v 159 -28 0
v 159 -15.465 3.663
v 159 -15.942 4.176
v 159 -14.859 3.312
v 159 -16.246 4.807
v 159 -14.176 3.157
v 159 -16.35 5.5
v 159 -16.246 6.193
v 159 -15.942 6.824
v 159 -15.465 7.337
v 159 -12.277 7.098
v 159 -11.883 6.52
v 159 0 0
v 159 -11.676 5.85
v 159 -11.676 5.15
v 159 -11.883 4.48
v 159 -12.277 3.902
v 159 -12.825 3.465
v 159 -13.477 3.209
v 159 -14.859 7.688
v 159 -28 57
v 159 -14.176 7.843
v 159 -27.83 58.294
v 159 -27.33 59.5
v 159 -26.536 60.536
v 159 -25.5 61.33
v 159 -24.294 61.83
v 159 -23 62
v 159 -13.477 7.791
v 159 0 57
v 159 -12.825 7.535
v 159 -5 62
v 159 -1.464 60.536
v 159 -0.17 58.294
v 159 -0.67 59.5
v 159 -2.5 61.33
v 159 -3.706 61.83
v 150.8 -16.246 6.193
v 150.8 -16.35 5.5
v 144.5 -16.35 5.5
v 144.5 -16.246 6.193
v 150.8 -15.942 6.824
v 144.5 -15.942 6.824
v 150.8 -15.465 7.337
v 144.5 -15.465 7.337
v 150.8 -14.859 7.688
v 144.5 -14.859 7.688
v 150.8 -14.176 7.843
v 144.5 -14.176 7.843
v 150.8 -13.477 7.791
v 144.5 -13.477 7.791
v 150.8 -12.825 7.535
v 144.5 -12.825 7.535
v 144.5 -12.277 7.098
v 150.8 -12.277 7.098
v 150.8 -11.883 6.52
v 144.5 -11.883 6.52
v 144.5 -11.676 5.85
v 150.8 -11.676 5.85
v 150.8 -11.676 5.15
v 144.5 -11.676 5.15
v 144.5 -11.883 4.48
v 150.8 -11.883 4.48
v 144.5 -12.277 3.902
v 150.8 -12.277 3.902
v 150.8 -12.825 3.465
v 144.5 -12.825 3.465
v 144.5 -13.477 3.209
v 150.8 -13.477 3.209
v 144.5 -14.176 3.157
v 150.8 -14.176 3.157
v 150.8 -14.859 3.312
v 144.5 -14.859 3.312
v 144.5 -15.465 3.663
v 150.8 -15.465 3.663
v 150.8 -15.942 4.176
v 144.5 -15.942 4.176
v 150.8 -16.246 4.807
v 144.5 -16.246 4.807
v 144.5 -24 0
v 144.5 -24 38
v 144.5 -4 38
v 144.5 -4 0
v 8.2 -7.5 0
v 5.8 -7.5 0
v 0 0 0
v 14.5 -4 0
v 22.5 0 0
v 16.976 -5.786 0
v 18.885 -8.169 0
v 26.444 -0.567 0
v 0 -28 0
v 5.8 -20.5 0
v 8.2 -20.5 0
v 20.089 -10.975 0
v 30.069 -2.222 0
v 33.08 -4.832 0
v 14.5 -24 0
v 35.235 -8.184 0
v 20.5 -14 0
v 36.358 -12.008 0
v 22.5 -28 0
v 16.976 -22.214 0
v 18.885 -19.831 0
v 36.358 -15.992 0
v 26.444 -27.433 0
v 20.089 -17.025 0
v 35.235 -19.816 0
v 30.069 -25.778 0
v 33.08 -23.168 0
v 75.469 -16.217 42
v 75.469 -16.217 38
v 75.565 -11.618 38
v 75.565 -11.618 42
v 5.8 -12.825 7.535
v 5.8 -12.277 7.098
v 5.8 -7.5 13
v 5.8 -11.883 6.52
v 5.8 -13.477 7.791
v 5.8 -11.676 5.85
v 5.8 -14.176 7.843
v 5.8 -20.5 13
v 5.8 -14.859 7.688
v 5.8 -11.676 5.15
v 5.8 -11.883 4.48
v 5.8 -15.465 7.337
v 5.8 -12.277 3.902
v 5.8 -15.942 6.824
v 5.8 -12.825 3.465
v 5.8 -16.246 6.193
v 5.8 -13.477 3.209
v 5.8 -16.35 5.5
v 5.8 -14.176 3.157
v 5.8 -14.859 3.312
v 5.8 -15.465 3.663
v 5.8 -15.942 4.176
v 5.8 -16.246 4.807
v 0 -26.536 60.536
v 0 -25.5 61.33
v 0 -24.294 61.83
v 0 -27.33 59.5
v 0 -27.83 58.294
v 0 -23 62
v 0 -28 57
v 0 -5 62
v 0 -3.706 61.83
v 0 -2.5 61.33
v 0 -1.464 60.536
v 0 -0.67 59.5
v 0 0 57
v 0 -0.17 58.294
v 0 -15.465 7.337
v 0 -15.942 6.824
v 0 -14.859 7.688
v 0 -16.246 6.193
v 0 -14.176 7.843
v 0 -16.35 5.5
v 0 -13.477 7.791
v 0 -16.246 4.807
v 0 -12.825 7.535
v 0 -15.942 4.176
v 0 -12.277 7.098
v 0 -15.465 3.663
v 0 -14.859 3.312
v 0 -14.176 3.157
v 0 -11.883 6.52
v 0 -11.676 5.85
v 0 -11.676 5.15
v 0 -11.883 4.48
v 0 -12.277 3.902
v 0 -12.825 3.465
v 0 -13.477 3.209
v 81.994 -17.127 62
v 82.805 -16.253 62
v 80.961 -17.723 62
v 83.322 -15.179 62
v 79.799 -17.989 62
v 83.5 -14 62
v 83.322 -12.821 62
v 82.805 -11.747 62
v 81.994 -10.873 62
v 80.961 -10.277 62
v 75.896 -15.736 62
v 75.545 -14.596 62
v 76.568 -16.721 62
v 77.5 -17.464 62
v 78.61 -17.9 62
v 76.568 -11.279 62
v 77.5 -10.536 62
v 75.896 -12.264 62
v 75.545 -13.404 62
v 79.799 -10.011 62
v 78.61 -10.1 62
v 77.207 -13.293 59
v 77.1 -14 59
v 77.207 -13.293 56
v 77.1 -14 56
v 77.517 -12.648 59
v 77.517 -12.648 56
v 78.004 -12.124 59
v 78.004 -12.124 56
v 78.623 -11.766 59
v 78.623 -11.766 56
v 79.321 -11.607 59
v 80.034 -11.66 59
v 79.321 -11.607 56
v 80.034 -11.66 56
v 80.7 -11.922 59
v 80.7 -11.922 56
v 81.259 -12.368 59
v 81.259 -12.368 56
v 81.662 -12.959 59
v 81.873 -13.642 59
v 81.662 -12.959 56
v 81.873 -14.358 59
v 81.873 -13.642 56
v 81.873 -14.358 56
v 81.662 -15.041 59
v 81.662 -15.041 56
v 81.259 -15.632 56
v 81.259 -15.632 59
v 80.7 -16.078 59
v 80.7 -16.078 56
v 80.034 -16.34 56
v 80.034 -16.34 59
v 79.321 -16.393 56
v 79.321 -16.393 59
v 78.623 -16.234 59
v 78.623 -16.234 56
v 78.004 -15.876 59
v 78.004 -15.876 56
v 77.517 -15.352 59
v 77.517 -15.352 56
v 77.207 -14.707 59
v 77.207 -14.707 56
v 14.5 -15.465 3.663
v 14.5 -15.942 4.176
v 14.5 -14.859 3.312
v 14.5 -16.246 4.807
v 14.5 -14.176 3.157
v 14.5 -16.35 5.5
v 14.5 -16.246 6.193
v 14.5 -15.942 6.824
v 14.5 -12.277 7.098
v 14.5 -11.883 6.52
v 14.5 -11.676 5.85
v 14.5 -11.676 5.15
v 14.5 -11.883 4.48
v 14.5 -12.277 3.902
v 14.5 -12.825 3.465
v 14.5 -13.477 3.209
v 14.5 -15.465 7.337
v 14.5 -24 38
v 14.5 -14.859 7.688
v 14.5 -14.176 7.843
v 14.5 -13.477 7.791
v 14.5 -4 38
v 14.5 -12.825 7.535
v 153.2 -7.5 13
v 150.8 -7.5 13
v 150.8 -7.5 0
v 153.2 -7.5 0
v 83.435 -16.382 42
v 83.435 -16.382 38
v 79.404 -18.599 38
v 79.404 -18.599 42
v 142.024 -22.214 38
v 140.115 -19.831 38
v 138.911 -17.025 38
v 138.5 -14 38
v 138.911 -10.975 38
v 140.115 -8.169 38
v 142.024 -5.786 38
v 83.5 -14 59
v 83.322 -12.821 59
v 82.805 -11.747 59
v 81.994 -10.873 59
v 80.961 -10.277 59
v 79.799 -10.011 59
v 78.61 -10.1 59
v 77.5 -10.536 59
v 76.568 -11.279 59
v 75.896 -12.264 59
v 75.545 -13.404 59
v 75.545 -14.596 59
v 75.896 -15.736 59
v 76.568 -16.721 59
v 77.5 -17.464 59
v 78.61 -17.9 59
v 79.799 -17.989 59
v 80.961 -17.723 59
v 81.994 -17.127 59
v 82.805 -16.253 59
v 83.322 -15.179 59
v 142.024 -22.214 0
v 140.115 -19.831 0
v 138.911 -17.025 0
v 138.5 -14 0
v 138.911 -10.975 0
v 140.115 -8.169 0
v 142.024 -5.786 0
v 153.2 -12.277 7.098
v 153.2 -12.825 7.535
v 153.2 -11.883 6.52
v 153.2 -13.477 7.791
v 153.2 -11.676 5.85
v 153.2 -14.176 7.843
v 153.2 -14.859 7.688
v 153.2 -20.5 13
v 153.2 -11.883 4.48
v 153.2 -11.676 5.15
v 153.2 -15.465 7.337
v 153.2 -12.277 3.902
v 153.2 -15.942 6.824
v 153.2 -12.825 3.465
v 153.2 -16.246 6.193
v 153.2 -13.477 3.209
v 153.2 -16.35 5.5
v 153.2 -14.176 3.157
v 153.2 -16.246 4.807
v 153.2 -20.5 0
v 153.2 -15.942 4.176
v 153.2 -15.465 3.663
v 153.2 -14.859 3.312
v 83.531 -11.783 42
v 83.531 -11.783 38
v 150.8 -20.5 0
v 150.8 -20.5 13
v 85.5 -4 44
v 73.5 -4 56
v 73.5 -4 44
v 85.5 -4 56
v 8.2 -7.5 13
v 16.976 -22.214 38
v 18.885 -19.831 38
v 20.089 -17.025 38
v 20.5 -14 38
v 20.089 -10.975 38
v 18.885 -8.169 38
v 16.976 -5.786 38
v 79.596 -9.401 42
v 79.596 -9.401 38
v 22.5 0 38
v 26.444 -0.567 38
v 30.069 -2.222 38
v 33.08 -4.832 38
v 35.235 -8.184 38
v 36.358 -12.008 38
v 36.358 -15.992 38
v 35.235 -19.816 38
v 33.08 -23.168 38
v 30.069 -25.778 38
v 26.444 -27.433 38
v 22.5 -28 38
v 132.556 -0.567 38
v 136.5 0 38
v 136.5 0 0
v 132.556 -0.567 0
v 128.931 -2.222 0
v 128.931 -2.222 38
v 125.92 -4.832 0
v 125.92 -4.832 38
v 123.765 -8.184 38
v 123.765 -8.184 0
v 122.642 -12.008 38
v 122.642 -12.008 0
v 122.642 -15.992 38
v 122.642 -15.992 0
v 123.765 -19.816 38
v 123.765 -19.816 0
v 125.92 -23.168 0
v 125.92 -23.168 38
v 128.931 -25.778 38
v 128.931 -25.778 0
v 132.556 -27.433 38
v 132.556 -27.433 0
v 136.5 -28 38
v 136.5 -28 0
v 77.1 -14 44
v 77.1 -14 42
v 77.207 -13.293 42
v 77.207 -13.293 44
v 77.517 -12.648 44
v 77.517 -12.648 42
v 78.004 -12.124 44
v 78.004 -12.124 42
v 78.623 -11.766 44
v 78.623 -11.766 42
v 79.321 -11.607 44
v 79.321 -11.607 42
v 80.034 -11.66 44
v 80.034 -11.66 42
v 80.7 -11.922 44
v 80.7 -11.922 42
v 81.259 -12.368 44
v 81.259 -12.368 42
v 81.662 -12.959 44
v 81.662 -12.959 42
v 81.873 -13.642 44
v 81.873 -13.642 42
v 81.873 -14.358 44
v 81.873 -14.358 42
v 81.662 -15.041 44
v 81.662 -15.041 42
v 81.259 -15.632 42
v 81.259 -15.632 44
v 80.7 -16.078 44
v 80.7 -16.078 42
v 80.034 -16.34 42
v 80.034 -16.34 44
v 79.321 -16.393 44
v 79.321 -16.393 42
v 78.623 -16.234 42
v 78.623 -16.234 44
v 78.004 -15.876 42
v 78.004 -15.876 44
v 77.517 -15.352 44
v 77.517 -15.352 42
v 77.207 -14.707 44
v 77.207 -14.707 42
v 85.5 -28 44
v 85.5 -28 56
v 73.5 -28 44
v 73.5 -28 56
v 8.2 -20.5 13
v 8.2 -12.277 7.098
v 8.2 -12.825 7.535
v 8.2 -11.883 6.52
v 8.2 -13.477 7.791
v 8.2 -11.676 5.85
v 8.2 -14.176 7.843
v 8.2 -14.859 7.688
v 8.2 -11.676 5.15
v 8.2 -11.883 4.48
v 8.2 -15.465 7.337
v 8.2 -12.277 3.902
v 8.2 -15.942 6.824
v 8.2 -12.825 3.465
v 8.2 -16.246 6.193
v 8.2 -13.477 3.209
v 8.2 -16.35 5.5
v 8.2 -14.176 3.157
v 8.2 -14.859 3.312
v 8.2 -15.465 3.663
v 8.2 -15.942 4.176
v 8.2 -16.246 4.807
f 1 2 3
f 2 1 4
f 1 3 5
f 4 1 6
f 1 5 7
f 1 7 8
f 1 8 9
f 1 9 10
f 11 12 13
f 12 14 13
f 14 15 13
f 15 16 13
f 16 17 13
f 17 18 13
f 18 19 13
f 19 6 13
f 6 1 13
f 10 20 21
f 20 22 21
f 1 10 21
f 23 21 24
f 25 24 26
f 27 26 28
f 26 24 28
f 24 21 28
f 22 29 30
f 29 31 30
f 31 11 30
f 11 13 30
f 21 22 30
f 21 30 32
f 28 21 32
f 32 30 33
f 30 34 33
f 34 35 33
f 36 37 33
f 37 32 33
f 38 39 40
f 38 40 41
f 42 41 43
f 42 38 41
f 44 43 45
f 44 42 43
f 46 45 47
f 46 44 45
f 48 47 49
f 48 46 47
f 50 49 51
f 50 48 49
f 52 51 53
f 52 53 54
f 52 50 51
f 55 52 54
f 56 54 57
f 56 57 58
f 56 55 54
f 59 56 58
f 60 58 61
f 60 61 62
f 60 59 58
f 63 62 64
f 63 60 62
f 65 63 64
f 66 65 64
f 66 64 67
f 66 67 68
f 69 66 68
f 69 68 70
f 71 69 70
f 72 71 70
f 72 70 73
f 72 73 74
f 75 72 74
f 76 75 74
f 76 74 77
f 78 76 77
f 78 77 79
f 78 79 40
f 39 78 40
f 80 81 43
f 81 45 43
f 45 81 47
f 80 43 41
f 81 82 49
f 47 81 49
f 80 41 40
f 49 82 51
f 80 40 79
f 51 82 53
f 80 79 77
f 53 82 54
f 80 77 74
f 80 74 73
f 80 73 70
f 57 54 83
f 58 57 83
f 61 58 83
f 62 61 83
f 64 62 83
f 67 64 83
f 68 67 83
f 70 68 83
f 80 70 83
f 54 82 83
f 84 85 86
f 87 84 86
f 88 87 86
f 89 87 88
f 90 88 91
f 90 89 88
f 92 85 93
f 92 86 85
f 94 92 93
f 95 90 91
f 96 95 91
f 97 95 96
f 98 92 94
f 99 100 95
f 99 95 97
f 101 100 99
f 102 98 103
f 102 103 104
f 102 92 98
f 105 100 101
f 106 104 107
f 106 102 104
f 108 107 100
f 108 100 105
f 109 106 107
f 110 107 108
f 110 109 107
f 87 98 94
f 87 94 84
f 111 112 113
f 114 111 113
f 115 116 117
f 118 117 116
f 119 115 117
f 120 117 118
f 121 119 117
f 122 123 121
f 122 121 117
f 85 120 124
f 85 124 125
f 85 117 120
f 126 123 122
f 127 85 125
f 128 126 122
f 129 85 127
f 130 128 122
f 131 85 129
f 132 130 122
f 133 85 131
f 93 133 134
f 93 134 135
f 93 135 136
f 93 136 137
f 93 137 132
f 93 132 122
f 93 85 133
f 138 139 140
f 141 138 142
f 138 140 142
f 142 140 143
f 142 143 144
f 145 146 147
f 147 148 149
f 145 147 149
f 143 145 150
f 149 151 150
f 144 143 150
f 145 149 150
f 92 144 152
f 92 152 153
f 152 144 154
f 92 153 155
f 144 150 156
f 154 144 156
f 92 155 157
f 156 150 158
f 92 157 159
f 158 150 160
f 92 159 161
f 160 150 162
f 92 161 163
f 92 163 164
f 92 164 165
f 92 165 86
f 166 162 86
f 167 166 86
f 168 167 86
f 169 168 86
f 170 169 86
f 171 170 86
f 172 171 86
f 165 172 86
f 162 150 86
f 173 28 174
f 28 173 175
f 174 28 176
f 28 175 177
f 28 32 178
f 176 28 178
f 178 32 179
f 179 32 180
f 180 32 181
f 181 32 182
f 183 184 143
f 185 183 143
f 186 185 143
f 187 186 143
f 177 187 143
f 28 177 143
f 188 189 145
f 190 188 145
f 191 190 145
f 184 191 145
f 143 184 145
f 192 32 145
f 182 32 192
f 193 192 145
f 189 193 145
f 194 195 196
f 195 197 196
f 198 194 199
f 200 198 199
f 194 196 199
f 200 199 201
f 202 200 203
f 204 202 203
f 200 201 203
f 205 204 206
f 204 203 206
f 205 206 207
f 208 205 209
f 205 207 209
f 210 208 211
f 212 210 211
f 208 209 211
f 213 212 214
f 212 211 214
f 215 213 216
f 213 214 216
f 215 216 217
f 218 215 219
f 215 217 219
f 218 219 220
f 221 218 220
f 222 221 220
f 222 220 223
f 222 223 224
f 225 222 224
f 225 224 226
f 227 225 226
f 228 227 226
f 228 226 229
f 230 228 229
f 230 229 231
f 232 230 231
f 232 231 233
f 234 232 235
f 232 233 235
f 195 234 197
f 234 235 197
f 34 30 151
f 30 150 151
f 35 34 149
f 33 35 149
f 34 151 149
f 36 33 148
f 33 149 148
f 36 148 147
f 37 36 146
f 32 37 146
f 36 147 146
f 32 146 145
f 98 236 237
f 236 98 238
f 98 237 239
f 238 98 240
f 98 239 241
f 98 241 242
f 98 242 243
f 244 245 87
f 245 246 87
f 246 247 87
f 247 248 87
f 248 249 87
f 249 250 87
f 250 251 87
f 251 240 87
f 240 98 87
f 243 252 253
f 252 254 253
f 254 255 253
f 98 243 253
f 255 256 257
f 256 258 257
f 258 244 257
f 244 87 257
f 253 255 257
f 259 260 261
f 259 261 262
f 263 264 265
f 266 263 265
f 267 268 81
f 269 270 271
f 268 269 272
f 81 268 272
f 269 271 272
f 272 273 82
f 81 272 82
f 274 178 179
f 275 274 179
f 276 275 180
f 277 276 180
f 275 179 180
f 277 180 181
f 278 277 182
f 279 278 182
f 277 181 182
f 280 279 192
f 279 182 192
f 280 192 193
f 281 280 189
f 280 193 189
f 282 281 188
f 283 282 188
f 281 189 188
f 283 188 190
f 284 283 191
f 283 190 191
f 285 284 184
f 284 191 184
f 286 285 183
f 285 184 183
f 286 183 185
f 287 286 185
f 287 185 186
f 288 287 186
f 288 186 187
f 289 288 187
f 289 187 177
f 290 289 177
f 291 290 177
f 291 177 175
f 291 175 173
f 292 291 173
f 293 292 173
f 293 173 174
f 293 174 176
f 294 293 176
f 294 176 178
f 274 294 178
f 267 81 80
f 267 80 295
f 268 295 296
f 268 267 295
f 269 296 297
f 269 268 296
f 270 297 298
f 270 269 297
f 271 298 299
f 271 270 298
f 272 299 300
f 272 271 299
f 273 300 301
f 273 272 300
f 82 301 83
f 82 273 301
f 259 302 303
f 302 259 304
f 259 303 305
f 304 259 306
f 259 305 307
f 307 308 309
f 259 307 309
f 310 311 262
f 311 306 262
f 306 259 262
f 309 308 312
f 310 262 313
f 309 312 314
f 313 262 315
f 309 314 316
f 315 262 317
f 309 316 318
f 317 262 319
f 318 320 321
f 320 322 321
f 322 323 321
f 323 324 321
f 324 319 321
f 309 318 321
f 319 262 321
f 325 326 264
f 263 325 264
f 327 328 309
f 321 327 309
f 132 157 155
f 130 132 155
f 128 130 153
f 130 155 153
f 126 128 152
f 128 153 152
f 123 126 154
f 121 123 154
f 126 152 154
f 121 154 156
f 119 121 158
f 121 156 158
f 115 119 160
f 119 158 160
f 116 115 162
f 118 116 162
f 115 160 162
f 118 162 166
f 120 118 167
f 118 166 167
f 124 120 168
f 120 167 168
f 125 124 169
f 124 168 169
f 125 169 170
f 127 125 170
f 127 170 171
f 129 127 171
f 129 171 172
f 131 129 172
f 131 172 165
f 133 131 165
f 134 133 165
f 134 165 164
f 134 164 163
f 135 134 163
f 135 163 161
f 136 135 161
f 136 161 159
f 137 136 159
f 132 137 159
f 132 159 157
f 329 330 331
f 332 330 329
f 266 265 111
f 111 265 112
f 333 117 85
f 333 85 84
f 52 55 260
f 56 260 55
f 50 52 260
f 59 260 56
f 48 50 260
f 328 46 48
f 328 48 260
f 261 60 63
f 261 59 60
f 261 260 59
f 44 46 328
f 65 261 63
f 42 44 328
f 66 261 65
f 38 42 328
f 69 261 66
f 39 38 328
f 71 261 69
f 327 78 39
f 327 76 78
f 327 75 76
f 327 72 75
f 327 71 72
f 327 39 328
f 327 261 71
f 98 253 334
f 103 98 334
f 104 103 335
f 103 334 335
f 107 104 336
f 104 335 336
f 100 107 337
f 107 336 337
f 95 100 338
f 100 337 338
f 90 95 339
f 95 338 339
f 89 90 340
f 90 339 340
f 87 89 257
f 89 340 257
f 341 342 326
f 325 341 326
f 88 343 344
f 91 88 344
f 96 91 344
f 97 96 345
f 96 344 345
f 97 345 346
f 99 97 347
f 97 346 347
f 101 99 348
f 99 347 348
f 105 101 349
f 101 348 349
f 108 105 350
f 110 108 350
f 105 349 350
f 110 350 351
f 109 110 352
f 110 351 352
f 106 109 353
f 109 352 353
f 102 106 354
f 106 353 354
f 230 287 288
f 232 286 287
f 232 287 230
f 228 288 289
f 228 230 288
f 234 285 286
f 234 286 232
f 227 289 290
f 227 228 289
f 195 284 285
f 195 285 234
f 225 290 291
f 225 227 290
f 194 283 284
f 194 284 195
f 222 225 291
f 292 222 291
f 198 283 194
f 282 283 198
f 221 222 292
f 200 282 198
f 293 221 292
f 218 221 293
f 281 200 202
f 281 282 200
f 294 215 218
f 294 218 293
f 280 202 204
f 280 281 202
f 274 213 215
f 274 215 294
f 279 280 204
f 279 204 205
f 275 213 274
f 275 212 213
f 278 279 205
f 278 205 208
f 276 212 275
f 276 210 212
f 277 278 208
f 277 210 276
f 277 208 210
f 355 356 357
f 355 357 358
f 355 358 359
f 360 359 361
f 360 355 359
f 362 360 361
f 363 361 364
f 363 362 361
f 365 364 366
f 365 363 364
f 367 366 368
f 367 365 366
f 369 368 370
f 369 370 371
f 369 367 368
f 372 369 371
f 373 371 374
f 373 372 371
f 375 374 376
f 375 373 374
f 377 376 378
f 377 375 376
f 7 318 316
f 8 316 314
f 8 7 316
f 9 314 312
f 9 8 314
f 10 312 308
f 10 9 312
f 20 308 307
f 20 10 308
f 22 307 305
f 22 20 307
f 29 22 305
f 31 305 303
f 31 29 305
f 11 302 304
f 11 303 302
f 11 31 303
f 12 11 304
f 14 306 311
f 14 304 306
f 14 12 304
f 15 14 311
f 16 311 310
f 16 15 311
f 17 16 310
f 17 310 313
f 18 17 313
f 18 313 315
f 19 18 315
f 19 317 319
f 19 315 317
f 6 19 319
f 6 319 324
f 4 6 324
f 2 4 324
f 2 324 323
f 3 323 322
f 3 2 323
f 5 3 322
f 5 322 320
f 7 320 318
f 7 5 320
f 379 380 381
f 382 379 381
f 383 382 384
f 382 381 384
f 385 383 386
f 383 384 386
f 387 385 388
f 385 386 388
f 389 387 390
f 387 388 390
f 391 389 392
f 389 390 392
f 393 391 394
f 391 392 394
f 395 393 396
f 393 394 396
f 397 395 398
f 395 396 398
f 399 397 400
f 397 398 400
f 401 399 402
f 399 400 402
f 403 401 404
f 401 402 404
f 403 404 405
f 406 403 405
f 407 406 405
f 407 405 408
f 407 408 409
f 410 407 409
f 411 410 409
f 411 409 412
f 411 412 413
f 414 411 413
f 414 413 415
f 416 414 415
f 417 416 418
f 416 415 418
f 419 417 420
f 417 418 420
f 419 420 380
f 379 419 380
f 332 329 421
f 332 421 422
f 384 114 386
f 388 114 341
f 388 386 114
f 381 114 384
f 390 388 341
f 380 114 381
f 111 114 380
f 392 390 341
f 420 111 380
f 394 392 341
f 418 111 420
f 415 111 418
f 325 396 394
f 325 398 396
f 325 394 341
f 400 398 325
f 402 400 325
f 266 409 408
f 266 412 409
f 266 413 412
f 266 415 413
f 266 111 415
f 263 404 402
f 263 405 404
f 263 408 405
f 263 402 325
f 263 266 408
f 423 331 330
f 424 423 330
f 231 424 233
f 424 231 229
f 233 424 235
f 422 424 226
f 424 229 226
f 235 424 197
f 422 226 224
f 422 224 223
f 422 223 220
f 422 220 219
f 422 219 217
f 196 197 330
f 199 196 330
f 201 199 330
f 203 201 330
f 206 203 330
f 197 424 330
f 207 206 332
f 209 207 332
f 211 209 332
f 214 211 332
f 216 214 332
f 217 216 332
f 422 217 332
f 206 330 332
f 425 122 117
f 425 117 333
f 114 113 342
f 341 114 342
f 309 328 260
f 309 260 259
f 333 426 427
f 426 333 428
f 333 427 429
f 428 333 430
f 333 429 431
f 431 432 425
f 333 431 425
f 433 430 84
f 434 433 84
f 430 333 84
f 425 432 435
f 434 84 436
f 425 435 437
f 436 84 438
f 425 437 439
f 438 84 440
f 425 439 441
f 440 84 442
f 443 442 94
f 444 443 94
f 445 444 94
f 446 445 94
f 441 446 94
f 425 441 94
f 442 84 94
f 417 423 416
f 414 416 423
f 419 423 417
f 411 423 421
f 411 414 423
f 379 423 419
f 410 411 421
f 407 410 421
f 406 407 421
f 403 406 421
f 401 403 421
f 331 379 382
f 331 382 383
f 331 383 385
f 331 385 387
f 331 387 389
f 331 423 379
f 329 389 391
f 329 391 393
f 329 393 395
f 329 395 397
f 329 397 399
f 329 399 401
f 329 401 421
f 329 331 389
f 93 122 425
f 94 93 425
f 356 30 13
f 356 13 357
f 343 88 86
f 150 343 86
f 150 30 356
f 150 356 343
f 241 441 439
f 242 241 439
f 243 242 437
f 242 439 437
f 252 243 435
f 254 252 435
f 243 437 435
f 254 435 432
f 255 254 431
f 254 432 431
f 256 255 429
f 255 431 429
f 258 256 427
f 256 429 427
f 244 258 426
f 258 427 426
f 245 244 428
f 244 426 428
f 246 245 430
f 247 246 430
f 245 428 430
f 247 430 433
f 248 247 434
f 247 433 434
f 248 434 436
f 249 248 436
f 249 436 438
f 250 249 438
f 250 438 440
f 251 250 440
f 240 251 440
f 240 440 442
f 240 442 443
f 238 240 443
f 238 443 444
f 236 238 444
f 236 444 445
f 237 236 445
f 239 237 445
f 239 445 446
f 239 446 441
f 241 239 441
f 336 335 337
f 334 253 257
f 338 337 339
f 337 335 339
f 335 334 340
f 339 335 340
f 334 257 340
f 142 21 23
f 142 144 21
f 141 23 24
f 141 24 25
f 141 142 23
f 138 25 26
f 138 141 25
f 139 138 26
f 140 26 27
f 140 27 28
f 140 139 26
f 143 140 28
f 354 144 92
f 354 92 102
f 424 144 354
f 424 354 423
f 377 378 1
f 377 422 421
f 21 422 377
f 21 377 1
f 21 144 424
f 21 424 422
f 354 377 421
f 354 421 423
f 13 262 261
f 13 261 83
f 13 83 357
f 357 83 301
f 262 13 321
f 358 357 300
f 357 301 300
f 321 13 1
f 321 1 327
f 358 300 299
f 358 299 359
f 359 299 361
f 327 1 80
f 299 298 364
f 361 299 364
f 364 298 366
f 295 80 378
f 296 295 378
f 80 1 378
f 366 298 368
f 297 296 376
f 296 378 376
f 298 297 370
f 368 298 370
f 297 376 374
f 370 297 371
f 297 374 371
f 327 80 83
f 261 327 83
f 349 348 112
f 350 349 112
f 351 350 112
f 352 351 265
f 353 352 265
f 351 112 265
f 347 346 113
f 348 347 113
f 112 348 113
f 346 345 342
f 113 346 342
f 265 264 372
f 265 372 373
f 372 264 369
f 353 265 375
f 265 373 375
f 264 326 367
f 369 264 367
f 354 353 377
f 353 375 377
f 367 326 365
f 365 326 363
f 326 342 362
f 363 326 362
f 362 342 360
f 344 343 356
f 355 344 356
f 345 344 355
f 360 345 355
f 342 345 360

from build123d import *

# Parameters (mm, degrees)
F0_W            = 12
F0_H            = 12
F1_DEPTH        = 28
F2_DEPTH        = 4
F3_W            = 2.4
F3_H            = 13
F4_DEPTH        = 13
F5_R            = 2.35
F6_DEPTH        = 14.5
F9_DEPTH        = 38
F11_D           = 4.8
F11_CBORE_D     = 8
F11_CBORE_DEPTH = 3
F12_DEPTH       = 4
F13_R           = 5


# Not quite as in the source:
# - a pattern or mirror of a feature is missing from the dataset's text; its kind, count and spacing are read off the source's solid


with BuildPart() as f1:
    # F0 (on Front) → F1 (new body)
    with BuildSketch(Plane.XZ):
        Polygon((0, 62), (0, 0), (14.5, 0), (14.5, 38), (144.5, 38), (144.5, 0), (159, 0), (159, 62), align=None)
        with Locations((79.5, 50)):
            Rectangle(F0_W, F0_H, mode=Mode.SUBTRACT)
    extrude(amount=F1_DEPTH)

    # F0 (on Front) → F2 (join)
    with BuildSketch(Plane.XZ):
        with Locations((79.5, 50)):
            Rectangle(F0_W, F0_H)
    extrude(amount=F2_DEPTH)

    # F3 (on face) → F4 (cut)
    with BuildSketch(Plane(origin=(0, 0, 0), x_dir=(1, 0, 0), z_dir=(0, 0, -1))):
        with Locations((7, 14)):
            Rectangle(F3_W, F3_H)
        with Locations((152, 14)):
            Rectangle(F3_W, F3_H)
    extrude(amount=-F4_DEPTH, mode=Mode.SUBTRACT)

    # F5 (on face) → F6 (cut)
    with BuildSketch(Plane(origin=(0, 0, 0), x_dir=(0, -1, 0), z_dir=(-1, 0, 0))):
        with Locations((14, 5.5)):
            Circle(F5_R)
    f6 = extrude(amount=-F6_DEPTH, mode=Mode.SUBTRACT)

    # F6_copies: F6 across plane
    add(f6.mirror(Plane(origin=(79.5, 0, 0), x_dir=(0, 0, 1), z_dir=(1, 0, 0))), mode=Mode.SUBTRACT)

    # F8 (on face) → F9 (join, through all)
    with BuildSketch(Plane(origin=(0, 0, 38), x_dir=(1, 0, 0), z_dir=(0, 0, -1))):
        with BuildLine():
            ThreePointArc((14.5, 24), (20.5, 14), (14.5, 4))
            Line((14.5, 4), (14.5, 0))
            Line((14.5, 0), (22.5, 0))
            ThreePointArc((22.5, 0), (36.5, 14), (22.5, 28))
            Line((22.5, 28), (14.5, 28))
            Line((14.5, 28), (14.5, 24))
        make_face()
    f9 = extrude(amount=F9_DEPTH)

    # F9_copies: F9 across plane
    add(f9.mirror(Plane(origin=(79.5, 0, 0), x_dir=(0, 0, 1), z_dir=(1, 0, 0))))

    # F11 (through all)
    with Locations(Plane.XY.offset(62)):
        with Locations((79.5, -14)):
            CounterBoreHole(F11_D / 2, F11_CBORE_D / 2, F11_CBORE_DEPTH)

    # F8 (on face) → F12 (cut)
    with BuildSketch(Plane(origin=(0, 0, 38), x_dir=(1, 0, 0), z_dir=(0, 0, -1))):
        Polygon((79.5955098336, 9.4009916426), (83.5306129865, 11.7832097635), (83.4351031529, 16.3822181209), (79.4044901664, 18.5990083574), (75.4693870135, 16.2167902365), (75.5648968471, 11.6177818791), align=None)
    extrude(amount=-F12_DEPTH, mode=Mode.SUBTRACT)

    # F13
    f13_edges = [f1.edges().sort_by_distance(p)[0] for p in [
        (79.5, -28, 62),
        (79.5, 0, 62),
    ]]
    fillet(f13_edges, radius=F13_R)


solid = f1.part
